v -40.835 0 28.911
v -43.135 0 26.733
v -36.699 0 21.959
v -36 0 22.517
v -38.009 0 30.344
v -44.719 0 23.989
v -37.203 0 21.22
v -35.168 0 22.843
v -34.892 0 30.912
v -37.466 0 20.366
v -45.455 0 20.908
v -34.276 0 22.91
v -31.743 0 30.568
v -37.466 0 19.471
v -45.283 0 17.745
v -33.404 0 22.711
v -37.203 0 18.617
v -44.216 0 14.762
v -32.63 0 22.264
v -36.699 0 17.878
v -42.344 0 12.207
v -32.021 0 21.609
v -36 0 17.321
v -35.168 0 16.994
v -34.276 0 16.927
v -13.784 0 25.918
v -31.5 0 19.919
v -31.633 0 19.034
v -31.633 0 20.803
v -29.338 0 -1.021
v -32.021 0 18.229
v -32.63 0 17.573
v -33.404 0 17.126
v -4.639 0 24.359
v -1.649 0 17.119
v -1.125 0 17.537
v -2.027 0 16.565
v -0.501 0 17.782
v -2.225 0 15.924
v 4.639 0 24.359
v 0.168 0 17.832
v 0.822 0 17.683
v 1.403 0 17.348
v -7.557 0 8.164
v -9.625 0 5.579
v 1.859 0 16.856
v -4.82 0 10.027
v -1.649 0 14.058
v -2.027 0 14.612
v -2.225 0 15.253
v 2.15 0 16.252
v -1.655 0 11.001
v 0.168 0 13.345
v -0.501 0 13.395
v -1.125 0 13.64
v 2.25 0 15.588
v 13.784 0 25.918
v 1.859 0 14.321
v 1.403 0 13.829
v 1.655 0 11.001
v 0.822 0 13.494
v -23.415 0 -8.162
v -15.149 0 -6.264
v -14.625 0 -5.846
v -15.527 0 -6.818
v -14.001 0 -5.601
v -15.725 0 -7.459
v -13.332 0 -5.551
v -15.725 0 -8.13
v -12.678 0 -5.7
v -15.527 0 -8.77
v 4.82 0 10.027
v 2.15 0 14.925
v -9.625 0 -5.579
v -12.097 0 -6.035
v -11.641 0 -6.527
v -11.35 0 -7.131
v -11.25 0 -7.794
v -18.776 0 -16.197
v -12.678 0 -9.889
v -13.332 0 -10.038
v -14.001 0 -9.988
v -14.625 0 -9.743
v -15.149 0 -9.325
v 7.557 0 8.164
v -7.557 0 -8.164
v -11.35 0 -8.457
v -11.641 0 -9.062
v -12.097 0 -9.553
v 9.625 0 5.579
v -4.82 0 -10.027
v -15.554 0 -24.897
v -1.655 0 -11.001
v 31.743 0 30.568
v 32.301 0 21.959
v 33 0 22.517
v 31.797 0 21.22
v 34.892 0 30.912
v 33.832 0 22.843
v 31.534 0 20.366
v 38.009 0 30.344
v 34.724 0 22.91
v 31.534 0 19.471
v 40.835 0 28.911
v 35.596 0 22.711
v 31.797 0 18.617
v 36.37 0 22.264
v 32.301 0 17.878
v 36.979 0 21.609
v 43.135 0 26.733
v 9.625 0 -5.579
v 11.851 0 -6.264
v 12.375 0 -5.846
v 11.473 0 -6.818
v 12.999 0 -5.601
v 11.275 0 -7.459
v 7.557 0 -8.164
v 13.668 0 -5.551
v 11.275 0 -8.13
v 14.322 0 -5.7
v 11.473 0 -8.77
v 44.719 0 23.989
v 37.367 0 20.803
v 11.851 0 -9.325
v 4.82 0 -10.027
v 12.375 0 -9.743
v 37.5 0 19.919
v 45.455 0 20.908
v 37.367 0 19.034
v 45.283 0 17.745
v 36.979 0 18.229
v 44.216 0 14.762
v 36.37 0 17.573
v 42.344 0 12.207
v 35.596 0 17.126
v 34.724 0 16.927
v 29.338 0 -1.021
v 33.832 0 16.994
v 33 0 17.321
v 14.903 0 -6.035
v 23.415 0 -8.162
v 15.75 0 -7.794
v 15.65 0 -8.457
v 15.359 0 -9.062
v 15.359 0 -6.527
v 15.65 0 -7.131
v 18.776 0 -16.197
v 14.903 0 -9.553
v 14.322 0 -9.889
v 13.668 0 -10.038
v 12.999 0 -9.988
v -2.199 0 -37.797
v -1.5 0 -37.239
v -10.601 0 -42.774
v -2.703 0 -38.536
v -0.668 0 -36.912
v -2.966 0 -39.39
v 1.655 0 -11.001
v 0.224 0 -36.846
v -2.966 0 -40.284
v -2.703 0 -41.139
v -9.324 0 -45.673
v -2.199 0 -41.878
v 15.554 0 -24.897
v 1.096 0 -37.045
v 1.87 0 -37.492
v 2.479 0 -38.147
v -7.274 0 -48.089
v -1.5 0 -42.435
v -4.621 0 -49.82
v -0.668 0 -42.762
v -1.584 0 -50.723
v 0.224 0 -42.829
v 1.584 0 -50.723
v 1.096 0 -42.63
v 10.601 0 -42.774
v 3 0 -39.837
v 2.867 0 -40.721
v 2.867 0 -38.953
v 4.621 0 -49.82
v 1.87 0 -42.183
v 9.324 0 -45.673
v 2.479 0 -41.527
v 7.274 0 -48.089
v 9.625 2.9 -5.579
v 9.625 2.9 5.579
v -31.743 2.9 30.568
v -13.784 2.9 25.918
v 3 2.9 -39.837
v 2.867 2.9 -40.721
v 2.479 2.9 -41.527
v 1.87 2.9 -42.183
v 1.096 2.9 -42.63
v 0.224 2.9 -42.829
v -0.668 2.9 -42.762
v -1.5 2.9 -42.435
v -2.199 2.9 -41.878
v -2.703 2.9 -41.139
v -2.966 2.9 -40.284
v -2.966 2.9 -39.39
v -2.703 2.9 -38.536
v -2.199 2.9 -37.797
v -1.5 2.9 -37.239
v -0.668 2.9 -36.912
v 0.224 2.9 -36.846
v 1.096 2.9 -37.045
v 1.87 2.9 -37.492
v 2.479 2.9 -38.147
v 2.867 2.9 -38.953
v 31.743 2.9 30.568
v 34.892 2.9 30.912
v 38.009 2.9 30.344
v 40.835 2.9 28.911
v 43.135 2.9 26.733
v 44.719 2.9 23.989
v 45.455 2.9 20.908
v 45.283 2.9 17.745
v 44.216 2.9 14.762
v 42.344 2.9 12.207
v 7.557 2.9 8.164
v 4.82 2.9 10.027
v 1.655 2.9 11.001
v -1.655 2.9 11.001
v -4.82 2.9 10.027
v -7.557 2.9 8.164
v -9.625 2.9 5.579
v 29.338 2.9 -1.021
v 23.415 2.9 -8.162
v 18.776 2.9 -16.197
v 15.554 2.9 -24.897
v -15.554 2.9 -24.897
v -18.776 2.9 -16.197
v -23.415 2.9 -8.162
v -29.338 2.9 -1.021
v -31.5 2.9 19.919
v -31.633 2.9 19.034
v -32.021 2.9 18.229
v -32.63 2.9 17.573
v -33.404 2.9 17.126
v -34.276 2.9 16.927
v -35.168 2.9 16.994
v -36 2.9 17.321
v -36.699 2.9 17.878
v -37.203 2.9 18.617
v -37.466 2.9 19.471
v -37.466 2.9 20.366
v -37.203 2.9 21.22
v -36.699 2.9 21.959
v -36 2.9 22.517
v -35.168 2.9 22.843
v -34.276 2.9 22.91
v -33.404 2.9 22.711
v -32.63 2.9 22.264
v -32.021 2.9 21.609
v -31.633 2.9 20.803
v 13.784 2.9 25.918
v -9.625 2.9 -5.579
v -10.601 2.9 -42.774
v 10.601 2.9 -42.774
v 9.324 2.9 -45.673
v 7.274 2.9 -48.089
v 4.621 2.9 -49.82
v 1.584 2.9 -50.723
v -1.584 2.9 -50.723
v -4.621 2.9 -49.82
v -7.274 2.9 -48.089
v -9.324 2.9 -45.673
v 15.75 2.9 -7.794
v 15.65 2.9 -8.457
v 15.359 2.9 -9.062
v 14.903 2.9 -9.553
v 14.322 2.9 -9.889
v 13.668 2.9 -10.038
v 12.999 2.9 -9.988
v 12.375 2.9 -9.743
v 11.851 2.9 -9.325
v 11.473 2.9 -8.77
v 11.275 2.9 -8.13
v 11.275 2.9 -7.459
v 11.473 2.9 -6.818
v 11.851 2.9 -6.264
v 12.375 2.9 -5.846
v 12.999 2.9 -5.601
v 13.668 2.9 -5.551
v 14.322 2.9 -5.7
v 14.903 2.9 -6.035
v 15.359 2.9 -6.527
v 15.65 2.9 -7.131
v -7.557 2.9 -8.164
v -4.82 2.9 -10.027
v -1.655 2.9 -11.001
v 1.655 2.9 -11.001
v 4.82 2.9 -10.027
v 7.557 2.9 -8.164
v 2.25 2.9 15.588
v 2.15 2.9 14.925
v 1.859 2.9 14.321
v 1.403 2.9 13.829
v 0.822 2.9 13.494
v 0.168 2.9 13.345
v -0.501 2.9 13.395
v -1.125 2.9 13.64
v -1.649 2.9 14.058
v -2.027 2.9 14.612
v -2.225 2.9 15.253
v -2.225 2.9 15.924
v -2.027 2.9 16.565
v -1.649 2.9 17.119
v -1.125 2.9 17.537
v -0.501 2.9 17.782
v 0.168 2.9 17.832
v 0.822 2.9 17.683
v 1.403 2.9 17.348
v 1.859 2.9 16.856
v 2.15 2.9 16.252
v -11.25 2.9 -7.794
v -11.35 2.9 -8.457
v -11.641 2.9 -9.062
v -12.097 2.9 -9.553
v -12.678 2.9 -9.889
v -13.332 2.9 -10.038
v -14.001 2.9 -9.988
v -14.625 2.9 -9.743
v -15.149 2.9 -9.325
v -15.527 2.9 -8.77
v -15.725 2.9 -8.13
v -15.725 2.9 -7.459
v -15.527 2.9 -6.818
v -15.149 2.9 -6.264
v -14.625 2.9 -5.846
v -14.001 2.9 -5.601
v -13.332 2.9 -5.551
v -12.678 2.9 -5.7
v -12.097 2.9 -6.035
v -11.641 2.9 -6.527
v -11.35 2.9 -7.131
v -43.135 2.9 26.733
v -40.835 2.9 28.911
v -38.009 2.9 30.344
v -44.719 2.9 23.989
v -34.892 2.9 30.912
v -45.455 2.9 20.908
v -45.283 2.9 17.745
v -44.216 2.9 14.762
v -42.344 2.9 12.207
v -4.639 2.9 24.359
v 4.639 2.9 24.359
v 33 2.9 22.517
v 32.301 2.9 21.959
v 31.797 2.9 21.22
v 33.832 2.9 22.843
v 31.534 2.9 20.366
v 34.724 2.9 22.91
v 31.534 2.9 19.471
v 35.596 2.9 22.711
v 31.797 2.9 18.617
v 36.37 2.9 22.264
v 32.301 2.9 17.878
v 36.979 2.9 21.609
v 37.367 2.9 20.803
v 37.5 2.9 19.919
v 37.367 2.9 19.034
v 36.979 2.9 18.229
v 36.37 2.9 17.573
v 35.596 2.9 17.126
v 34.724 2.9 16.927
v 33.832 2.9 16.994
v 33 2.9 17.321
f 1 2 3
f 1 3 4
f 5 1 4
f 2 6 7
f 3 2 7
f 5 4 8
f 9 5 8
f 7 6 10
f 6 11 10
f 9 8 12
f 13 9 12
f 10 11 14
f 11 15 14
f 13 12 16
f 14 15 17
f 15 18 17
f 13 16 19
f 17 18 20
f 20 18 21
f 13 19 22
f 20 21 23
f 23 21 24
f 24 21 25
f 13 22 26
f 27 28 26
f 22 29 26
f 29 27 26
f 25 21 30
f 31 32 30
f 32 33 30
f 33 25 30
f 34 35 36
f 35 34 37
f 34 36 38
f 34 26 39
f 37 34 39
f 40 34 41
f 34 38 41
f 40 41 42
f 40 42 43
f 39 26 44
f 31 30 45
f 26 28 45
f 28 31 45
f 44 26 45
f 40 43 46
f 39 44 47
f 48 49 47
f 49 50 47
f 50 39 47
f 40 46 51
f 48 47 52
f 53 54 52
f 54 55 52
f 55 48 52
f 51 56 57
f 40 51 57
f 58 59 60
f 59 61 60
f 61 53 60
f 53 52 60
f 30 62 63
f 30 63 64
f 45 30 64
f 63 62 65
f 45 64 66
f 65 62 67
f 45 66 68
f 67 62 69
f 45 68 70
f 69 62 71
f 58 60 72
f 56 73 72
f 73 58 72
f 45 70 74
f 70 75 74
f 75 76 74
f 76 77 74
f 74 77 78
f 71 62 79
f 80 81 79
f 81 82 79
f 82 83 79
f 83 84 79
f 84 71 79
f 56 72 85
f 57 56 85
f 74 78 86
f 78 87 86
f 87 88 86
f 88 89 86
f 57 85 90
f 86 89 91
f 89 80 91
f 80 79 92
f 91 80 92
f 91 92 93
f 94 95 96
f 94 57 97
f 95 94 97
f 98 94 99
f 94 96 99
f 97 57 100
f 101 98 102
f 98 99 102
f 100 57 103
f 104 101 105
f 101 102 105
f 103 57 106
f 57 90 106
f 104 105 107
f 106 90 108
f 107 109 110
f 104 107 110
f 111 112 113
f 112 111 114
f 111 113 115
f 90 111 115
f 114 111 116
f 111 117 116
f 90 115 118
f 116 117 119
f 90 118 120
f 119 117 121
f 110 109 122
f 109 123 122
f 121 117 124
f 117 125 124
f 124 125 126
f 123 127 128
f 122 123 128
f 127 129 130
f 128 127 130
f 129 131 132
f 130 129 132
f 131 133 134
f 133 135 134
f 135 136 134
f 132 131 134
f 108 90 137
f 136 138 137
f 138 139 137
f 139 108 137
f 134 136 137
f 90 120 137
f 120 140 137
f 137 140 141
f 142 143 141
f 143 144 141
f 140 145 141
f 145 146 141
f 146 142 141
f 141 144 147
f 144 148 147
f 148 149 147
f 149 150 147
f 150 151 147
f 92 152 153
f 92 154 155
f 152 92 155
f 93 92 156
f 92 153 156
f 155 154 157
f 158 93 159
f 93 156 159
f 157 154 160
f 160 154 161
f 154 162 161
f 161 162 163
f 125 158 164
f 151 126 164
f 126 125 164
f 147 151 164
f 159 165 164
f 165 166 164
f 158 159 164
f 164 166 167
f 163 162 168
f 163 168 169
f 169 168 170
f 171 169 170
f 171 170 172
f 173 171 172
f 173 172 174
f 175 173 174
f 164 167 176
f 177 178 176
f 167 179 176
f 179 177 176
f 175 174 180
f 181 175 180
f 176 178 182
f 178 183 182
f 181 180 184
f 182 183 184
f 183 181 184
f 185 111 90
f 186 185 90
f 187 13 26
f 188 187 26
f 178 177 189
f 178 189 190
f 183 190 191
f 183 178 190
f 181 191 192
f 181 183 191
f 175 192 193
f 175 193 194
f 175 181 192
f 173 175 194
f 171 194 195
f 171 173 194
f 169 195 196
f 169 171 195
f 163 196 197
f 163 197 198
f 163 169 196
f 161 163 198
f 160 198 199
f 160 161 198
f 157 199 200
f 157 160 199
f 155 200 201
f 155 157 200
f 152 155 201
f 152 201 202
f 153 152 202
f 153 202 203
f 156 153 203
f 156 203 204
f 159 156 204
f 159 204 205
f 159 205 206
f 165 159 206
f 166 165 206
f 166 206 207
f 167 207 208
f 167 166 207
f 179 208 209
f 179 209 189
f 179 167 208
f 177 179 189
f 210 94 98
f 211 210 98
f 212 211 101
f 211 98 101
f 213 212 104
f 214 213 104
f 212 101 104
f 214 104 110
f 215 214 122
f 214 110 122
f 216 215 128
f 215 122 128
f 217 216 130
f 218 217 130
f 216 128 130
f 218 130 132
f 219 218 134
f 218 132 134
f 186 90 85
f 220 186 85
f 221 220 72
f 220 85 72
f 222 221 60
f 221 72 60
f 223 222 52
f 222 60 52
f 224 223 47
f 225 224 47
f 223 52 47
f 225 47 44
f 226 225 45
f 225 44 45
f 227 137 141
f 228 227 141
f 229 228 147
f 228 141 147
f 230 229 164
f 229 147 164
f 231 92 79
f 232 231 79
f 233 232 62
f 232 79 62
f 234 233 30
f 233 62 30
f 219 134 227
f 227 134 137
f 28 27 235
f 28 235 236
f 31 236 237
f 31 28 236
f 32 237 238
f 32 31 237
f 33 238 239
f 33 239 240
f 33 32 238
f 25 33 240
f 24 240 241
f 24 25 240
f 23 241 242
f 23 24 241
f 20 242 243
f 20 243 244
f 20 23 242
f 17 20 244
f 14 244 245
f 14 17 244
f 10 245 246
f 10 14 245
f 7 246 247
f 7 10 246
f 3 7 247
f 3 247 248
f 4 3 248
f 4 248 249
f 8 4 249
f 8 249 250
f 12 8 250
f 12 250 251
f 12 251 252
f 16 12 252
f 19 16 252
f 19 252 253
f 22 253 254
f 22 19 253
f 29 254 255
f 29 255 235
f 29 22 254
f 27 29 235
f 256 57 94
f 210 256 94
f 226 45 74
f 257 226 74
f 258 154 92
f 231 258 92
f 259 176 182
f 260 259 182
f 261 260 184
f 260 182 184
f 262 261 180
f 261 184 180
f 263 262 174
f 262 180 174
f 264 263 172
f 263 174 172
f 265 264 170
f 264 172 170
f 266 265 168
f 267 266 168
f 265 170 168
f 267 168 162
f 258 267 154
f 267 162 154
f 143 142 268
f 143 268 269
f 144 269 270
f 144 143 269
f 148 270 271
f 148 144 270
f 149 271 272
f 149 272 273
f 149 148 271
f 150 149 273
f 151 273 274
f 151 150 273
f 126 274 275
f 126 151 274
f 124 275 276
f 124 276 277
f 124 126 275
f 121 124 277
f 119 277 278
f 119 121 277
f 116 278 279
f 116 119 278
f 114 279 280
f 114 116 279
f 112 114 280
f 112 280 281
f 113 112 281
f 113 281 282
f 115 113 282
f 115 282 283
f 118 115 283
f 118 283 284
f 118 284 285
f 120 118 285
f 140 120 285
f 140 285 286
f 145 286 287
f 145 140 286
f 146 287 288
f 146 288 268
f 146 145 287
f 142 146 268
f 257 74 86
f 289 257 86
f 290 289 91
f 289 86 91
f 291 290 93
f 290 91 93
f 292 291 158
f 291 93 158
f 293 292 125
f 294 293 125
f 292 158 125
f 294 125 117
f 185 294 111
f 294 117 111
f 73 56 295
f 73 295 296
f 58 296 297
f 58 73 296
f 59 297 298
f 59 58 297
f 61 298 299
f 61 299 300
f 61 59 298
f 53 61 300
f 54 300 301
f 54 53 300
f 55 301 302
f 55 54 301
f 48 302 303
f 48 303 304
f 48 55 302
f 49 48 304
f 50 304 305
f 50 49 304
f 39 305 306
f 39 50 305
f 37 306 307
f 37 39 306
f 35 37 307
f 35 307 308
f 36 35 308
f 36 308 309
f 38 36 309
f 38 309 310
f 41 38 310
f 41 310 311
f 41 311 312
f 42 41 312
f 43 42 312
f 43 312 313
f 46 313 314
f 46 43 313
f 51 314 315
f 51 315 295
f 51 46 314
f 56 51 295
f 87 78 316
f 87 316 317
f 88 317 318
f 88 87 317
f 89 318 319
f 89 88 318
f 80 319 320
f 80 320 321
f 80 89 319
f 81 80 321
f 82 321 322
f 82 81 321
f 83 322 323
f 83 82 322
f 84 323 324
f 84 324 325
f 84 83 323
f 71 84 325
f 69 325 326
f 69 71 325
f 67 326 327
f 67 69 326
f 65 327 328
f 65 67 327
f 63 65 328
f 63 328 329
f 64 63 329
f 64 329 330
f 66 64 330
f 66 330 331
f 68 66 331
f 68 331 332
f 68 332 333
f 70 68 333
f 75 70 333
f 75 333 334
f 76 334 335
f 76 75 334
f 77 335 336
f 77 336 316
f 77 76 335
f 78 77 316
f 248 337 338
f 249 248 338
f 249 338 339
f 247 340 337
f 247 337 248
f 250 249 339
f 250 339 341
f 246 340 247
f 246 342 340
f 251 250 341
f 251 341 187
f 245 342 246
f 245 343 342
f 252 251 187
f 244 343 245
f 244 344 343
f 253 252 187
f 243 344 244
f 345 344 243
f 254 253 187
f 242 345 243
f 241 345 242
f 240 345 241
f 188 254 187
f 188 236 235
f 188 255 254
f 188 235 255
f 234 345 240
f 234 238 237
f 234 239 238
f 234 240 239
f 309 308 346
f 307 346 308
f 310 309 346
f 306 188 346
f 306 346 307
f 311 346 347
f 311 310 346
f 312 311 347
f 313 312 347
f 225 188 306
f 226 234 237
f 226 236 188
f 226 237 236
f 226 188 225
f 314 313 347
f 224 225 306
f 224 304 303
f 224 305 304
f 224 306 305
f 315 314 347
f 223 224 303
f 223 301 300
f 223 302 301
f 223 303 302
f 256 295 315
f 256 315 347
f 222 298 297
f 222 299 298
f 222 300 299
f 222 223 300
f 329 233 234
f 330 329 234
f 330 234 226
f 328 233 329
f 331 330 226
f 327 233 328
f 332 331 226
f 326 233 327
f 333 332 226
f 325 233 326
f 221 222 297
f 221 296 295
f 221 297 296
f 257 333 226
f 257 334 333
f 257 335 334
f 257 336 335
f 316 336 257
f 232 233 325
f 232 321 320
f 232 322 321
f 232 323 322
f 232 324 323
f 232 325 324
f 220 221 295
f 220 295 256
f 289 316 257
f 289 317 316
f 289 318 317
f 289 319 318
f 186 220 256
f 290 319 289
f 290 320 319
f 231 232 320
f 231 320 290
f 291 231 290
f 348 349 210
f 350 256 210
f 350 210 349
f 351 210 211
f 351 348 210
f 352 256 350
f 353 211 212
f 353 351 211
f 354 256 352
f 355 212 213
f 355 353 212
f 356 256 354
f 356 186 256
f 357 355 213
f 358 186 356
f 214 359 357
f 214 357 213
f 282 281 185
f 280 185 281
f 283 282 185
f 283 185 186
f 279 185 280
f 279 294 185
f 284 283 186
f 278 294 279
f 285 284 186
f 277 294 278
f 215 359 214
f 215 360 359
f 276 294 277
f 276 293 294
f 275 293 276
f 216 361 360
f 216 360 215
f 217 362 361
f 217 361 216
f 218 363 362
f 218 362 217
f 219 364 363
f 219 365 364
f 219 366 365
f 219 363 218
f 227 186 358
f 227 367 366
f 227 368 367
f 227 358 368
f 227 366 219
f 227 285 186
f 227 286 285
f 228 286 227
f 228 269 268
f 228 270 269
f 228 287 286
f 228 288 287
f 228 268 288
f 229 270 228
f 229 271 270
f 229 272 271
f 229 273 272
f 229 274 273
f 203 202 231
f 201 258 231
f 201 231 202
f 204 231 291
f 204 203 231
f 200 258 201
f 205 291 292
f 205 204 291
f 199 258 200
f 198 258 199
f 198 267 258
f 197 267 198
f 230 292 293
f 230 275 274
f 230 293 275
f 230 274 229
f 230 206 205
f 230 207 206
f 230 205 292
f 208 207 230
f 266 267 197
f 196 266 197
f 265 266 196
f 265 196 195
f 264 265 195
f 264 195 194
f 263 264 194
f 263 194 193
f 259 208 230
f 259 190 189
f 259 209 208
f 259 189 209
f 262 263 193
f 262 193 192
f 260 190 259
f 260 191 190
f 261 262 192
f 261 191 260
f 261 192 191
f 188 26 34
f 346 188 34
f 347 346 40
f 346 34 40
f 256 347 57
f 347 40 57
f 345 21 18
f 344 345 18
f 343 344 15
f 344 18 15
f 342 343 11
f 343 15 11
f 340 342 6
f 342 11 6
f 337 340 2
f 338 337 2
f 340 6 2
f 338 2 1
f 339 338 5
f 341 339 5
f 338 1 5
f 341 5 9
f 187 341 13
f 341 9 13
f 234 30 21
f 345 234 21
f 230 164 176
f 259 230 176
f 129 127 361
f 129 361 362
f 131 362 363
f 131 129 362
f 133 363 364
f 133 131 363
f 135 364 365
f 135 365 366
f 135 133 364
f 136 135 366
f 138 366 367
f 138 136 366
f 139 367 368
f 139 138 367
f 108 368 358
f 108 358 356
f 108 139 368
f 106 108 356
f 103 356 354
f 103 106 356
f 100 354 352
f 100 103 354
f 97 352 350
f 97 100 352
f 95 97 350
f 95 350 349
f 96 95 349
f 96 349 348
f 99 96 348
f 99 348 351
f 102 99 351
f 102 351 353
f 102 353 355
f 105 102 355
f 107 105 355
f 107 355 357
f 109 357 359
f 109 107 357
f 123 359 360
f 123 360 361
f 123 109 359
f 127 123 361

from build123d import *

# Parameters (mm, degrees)
SKETCH1_R           = 2.25
SKETCH1_R_2         = 11
SKETCH1_R_3         = 3
BOSS_EXTRUDE1_DEPTH = 2.9


with BuildPart() as part:
    # Sketch1 → Boss-Extrude1 (new body)
    with BuildSketch(Plane(origin=(0, 0, 0), x_dir=(1, 0, 0), z_dir=(0, 1, 0))):
        with BuildLine():
            ThreePointArc((-23.5, -19.918584287), (-25.801559897, -26.651870244), (-31.743116322, -30.567508758))
            Line((-31.743116322, -30.567508758), (-13.784418389, -25.918209071))
            ThreePointArc((-13.784418389, -25.918209071), (0, -24.162831426), (13.784418389, -25.918209071))
            Line((13.784418389, -25.918209071), (31.743116322, -30.567508758))
            ThreePointArc((31.743116322, -30.567508758), (24.973720558, -14.418584287), (42.343797276, -12.206590751))
            Line((42.343797276, -12.206590751), (29.338036671, 1.021448035))
            ThreePointArc((29.338036671, 1.021448035), (20.925625842, 12.081415713), (15.553618282, 24.896761037))
            Line((15.553618282, 24.896761037), (10.600680954, 42.774099509))
            ThreePointArc((10.600680954, 42.774099509), (10.899713081, 41.319145212), (11, 39.837168574))
            ThreePointArc((11, 39.837168574), (-1.481976638, 28.937455493), (-10.600680954, 42.774099509))
            Line((-10.600680954, 42.774099509), (-15.553618282, 24.896761037))
            ThreePointArc((-15.553618282, 24.896761037), (-20.925625842, 12.081415713), (-29.338036671, 1.021448035))
            Line((-29.338036671, 1.021448035), (-42.343797276, -12.206590751))
            ThreePointArc((-42.343797276, -12.206590751), (-30.333572876, -9.738167546), (-23.5, -19.918584287))
        make_face()
        with Locations((0, -15.588457268)):
            Circle(SKETCH1_R, mode=Mode.SUBTRACT)
        with Locations((-13.5, 7.794228634)):
            Circle(SKETCH1_R, mode=Mode.SUBTRACT)
        with BuildLine():
            Line((-9.625, -5.578978401), (-9.625, 5.578978401))
            ThreePointArc((-9.625, 5.578978401), (0, 11.125), (9.625, 5.578978401))
            Line((9.625, 5.578978401), (9.625, -5.578978401))
            ThreePointArc((9.625, -5.578978401), (0, -11.125), (-9.625, -5.578978401))
        make_face(mode=Mode.SUBTRACT)
        with Locations((13.5, 7.794228634)):
            Circle(SKETCH1_R, mode=Mode.SUBTRACT)
        with Locations((-34.5, -19.918584287)):
            Circle(SKETCH1_R_2)
        with Locations((-34.5, -19.918584287)):
            Circle(SKETCH1_R_3, mode=Mode.SUBTRACT)
        with Locations((34.5, -19.918584287)):
            Circle(SKETCH1_R_2)
        with Locations((34.5, -19.918584287)):
            Circle(SKETCH1_R_3, mode=Mode.SUBTRACT)
        with Locations((0, 39.837168574)):
            Circle(SKETCH1_R_2)
        with Locations((0, 39.837168574)):
            Circle(SKETCH1_R_3, mode=Mode.SUBTRACT)
    extrude(amount=BOSS_EXTRUDE1_DEPTH)


solid = part.part
